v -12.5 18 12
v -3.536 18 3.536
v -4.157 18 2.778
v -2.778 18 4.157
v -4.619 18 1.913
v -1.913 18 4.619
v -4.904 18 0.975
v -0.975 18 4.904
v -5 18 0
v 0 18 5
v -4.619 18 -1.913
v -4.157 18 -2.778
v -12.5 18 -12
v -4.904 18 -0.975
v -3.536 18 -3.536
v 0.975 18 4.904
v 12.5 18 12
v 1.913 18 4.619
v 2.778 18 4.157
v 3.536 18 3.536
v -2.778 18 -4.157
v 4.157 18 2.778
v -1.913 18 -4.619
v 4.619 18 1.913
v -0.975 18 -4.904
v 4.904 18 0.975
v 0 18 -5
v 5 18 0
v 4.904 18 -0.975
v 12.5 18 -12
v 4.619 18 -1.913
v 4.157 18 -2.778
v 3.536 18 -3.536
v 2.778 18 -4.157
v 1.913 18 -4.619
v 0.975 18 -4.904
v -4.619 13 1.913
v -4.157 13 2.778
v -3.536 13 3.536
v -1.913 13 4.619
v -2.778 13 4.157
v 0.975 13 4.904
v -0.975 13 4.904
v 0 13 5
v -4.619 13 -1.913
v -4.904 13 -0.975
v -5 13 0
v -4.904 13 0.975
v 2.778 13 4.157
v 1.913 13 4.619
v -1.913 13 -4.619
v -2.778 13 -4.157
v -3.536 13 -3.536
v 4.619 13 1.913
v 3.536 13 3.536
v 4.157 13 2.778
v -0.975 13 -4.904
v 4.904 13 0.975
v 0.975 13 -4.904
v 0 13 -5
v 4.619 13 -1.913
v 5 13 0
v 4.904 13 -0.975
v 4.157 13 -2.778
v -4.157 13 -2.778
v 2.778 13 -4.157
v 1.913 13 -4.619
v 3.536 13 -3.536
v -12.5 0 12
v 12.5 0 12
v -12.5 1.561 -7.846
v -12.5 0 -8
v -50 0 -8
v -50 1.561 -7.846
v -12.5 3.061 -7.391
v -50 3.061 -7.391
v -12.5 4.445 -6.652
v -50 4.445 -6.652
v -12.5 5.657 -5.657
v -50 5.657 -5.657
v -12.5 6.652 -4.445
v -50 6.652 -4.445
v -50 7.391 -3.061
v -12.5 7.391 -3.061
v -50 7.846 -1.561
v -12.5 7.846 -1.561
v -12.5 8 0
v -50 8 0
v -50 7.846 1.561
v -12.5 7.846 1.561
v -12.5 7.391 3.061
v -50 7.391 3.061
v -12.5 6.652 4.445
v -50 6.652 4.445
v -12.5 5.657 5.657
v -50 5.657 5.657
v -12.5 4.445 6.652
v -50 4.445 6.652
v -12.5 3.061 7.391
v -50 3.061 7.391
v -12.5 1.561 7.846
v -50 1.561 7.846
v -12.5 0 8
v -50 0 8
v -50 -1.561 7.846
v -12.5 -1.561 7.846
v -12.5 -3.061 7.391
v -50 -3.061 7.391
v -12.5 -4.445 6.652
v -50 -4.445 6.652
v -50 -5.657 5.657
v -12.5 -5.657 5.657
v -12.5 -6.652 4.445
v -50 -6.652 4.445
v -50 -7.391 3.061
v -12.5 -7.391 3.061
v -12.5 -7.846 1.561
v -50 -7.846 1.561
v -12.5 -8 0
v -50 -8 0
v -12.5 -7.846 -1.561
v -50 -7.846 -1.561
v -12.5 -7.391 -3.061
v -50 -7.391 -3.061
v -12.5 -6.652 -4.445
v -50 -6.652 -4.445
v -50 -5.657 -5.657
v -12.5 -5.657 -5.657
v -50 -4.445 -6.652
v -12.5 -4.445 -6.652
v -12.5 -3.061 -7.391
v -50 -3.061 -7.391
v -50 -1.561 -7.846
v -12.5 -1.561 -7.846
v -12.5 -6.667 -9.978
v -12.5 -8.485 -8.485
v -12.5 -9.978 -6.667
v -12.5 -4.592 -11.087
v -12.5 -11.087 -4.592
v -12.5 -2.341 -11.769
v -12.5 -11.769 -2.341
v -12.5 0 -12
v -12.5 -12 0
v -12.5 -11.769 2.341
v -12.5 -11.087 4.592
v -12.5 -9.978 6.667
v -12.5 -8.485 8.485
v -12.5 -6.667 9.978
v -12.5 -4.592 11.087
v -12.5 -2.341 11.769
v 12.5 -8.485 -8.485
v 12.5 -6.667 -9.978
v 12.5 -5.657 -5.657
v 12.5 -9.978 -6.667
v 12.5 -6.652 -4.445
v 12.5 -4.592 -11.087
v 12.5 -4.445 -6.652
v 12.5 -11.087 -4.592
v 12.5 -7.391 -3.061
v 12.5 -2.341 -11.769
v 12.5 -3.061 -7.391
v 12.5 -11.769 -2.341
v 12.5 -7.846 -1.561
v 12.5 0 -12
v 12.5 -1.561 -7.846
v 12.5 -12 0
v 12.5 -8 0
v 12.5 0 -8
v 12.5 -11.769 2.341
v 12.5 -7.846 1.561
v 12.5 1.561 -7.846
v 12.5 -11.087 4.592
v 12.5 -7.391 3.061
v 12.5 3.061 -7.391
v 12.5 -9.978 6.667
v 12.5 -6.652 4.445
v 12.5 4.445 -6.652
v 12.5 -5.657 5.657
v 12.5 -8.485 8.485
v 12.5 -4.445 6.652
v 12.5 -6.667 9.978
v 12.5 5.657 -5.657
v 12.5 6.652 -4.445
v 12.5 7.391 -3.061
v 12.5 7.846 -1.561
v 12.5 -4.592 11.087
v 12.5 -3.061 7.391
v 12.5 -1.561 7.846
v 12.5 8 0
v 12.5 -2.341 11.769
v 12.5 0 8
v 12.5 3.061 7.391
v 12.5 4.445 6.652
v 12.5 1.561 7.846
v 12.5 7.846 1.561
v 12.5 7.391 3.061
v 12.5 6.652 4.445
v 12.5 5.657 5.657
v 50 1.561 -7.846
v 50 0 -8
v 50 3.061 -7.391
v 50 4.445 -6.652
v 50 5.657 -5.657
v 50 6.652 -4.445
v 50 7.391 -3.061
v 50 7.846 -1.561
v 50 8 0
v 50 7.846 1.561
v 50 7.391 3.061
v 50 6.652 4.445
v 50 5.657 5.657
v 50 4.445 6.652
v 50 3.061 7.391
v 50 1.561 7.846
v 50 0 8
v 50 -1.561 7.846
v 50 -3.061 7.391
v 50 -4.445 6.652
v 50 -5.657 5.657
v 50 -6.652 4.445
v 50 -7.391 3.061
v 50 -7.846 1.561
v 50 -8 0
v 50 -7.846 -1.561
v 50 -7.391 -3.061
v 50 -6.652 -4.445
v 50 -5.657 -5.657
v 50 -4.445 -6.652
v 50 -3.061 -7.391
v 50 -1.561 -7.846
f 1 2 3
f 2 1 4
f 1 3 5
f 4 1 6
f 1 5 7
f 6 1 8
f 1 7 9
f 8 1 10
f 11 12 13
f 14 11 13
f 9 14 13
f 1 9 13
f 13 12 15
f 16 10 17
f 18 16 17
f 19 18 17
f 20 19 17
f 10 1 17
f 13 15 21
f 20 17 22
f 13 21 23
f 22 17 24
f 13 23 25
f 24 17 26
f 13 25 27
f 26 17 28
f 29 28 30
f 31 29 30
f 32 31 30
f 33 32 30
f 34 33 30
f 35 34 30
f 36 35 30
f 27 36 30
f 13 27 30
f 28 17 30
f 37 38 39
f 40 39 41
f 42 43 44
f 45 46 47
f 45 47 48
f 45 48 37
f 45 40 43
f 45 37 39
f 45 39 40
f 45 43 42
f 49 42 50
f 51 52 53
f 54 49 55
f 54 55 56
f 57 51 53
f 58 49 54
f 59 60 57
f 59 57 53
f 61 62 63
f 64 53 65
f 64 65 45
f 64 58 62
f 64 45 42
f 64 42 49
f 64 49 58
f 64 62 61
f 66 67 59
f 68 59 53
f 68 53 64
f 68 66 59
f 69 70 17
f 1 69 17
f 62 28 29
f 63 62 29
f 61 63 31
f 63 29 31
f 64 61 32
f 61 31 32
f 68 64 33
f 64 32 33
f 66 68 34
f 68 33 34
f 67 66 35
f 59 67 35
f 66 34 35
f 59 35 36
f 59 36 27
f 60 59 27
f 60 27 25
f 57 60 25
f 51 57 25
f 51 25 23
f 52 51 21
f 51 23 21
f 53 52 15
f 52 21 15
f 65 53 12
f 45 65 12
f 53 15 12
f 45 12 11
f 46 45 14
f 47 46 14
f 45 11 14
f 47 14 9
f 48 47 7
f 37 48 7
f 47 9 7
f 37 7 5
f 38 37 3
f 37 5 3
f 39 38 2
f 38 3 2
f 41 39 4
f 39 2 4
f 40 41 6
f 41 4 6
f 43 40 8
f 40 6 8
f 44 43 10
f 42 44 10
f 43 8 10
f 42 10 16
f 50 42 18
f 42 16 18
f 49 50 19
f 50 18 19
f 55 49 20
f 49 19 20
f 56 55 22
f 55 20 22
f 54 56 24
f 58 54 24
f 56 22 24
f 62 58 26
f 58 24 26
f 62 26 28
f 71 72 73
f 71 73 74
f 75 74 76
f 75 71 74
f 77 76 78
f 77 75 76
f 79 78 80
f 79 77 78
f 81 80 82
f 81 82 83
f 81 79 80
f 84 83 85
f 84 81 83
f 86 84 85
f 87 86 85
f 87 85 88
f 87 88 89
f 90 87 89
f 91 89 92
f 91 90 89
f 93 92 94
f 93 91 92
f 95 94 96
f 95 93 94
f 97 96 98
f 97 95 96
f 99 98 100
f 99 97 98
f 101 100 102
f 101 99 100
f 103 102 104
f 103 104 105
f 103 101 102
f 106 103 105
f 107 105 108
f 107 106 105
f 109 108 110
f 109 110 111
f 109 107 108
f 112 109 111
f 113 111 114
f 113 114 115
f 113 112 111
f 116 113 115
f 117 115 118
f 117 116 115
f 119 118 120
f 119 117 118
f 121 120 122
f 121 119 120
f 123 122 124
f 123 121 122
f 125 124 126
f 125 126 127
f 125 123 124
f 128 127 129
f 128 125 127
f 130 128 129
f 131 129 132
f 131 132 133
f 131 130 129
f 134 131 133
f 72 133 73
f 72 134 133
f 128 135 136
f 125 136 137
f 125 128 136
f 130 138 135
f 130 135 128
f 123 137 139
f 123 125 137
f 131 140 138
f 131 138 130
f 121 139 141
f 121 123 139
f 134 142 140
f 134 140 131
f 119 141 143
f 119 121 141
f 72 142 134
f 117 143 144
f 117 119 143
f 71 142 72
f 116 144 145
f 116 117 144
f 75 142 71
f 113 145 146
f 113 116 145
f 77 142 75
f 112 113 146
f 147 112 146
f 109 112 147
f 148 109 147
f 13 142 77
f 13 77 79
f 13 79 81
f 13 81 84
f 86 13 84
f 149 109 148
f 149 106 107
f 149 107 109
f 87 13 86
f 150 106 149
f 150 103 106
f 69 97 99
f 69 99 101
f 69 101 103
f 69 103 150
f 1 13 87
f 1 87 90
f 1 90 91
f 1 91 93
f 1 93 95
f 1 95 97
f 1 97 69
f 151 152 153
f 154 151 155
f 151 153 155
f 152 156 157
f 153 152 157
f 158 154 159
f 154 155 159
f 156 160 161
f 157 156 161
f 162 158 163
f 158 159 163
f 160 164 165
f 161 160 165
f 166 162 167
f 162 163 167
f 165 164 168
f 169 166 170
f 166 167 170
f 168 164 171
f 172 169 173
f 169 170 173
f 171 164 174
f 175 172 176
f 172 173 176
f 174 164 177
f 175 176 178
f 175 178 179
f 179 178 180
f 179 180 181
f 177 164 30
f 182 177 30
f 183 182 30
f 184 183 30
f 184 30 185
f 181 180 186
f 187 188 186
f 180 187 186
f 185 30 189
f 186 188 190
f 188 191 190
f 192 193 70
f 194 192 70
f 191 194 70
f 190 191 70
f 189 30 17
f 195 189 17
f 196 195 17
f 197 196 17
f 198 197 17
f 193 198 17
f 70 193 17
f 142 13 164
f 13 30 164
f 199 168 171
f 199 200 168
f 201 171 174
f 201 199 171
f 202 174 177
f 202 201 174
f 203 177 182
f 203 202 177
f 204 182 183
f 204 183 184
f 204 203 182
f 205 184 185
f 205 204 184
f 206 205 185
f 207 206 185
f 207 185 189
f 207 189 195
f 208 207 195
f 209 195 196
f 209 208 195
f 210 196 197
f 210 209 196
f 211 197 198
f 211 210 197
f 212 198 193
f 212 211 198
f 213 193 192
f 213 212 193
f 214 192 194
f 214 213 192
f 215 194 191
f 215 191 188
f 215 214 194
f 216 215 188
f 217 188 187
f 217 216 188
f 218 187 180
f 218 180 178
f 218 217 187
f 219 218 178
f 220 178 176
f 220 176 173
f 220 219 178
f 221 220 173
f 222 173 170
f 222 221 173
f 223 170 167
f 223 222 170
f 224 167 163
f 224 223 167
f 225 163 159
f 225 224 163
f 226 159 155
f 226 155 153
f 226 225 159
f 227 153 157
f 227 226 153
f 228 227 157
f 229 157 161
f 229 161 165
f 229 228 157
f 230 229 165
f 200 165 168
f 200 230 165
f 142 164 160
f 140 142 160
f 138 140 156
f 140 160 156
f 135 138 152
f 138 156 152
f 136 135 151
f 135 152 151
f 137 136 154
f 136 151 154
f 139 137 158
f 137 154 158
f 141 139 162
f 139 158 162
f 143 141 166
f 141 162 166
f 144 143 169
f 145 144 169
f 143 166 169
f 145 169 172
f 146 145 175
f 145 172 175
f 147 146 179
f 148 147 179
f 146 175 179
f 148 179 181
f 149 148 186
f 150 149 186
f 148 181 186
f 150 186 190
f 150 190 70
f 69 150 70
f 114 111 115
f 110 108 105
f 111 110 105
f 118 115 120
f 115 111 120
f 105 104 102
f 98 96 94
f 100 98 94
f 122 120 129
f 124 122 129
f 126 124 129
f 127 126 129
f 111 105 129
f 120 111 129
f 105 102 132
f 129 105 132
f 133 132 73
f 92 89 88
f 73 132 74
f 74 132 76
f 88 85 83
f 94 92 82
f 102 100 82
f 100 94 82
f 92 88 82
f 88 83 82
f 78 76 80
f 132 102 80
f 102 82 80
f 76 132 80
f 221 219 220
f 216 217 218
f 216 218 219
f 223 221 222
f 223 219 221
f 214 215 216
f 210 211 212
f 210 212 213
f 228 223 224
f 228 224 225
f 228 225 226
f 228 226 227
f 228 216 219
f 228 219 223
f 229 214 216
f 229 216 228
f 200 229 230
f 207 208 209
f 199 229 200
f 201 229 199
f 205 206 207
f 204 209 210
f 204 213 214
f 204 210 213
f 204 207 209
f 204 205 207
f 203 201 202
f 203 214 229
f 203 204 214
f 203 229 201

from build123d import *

# Parameters (mm, degrees)
BOSS_EXTRUDE1_DEPTH = 12.5
SKETCH2_R           = 8
BOSS_EXTRUDE2_DEPTH = 50
SKETCH3_R           = 5
CUT_EXTRUDE1_DEPTH  = 5


with BuildPart() as part:
    # Sketch1 → Boss-Extrude1 (new body, symmetric)
    with BuildSketch(Plane(origin=(0, 0, 0), x_dir=(0, 0, -1), z_dir=(1, 0, 0))):
        with BuildLine():
            Line((-12, 0), (-12, 18))
            Line((-12, 18), (12, 18))
            Line((12, 18), (12, 0))
            ThreePointArc((12, 0), (0, -12), (-12, 0))
        make_face()
    extrude(amount=BOSS_EXTRUDE1_DEPTH, both=True)

    # Sketch2 → Boss-Extrude2 (add, symmetric)
    with BuildSketch(Plane(origin=(0, 0, 0), x_dir=(0, 0, -1), z_dir=(1, 0, 0))):
        Circle(SKETCH2_R)
    extrude(amount=BOSS_EXTRUDE2_DEPTH, both=True)

    # Sketch3 → Cut-Extrude1 (cut)
    with BuildSketch(Plane(origin=(0, 18, 0), x_dir=(1, 0, 0), z_dir=(0, 1, 0))):
        Circle(SKETCH3_R)
    extrude(amount=-CUT_EXTRUDE1_DEPTH, mode=Mode.SUBTRACT)


solid = part.part
